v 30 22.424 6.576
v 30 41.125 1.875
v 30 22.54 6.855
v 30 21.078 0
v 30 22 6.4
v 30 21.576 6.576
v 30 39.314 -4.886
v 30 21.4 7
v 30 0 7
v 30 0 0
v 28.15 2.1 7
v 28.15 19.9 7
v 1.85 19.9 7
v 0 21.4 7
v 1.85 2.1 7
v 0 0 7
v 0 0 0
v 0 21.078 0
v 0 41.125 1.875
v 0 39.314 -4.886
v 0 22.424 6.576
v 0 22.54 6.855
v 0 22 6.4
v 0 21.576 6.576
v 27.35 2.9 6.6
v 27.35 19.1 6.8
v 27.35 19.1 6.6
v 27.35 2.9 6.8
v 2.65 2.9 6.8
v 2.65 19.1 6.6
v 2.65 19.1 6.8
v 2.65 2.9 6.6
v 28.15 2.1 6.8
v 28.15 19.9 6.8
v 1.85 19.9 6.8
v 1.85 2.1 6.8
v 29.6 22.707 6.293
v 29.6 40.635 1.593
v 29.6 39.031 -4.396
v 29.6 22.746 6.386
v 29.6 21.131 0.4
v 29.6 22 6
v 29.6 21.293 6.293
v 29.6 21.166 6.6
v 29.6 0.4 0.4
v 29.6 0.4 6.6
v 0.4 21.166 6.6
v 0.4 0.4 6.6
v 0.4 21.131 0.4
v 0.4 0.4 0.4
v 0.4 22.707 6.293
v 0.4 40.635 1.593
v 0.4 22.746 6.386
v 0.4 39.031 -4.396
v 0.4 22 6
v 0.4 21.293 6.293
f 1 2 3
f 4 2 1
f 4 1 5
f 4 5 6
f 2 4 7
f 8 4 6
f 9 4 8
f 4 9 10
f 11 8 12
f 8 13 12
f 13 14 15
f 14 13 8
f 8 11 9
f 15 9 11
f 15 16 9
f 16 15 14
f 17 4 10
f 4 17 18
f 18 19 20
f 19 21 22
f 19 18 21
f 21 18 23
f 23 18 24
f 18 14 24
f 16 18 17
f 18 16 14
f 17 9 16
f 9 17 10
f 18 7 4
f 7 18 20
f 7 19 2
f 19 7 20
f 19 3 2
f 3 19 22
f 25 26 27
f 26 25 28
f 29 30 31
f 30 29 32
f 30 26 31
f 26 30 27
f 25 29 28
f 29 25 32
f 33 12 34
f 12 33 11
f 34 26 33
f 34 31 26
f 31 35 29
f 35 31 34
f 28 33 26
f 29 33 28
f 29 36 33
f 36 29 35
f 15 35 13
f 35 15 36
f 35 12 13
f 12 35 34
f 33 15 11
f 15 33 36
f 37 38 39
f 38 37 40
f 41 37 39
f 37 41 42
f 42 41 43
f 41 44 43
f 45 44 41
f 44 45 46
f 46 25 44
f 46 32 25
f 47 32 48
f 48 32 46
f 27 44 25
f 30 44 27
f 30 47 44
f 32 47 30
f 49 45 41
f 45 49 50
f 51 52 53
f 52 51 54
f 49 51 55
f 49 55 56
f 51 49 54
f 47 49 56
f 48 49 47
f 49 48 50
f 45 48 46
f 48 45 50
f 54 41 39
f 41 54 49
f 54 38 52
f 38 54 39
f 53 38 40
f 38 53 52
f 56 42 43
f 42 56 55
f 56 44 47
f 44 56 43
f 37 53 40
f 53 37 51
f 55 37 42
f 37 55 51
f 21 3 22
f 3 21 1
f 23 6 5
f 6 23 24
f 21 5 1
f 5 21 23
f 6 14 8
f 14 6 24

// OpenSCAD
echo(version=version());

//Display casing
casing_width     = 30;
casing_depth     = 22;
casing_height    = 7;
casing_thiccness = 0.4;

//Display hole
display_width  = 24.7;
display_depth  = 16.2;
display_height = 1.6;

//Display bezel
bezel_size      = 1.6;
bezel_thiccness = 0.2;

//Keyboard
keyboard_angle       = -15;
keyboard_depth_ratio = 0.9;

//Separator
separator_diameter = 1;
separator_depth = 5;
separator_segments = 8;

module rotate_about_pt(x, z, y, pt){
    translate(pt)
    rotate([x, y, z])
    translate(-pt)
    children();
}

module display_casing(hollow){
  if (hollow == false) {
    difference(){
      //Body
      color("gray")
      cube([casing_width, casing_depth, casing_height], center= false);
    }
  }
  else {
    union(){
      //Display hole
      display_width_offset = (casing_width - display_width) / 2;
      display_depth_offset = (casing_depth - display_depth) / 2;
      display_height_offset = casing_height - display_height;
      color("red")
      translate([display_width_offset, display_depth_offset, display_height_offset])
      cube([display_width, display_depth, display_height], center= false);

      //Display bezel
      bezel_width_offset = (casing_width - display_width - bezel_size) / 2;
      bezel_depth_offset = (casing_depth - display_depth - bezel_size) / 2;
      bezel_height_offset = casing_height - bezel_thiccness;
      color("blue")
      translate([bezel_width_offset, bezel_depth_offset, bezel_height_offset])
      cube([display_width + bezel_size, display_depth + bezel_size, bezel_thiccness], center= false);

      //Cavity
      translate([casing_thiccness, casing_thiccness, casing_thiccness])
      cube([casing_width - casing_thiccness * 2,
        casing_depth - casing_thiccness * 2 + casing_thiccness,
        casing_height - casing_thiccness * 2],
        center= false);
    }
  }
}

module keyboard(hollow){
  //Apply ration to every element in keyboard modue
  translate([0, casing_depth, 0])
  rotate_about_pt(keyboard_angle, 0, 0, [0, 0, casing_height])

  if (hollow == false){
    cube([casing_width, casing_depth * keyboard_depth_ratio, casing_height], center= false);
  }
  else {
    translate([casing_thiccness, 0, casing_thiccness])
    cube([casing_width - casing_thiccness * 2,
      casing_depth * keyboard_depth_ratio - casing_thiccness,
      casing_height - casing_thiccness * 2],
      center= false);
  }
}

module separator(hollow){
  diameter= hollow ? separator_diameter - casing_thiccness : separator_diameter;
  e=.02;
  color("purple")
  translate([casing_width, casing_depth, casing_height])
  rotate([0, -90, 0])
  if (hollow == false) {
    difference(){
        cylinder($fn= separator_segments,
        h= casing_width,
        r= diameter,
        center= false);
      translate([0, -diameter, -e])
      rotate_about_pt(0, -keyboard_angle * 0.8,  0, [0, 0, casing_height])
      cube([diameter * 2, diameter * 2, casing_width + 2 * e]);
    }
  }
  else {
    cylinder($fn= separator_segments,
      h= casing_width,
      r= diameter,
      center= false);
  }
}

module main_body(){
  difference(){
    union (){
      difference(){
        union(){
          display_casing(false);
          keyboard(false);
        }
        keyboard(true);
        display_casing(true);
      }
      separator(false);
    }
    separator(true);
  }
}

//minkowski() {
main_body();
//  sphere(1);
//}
